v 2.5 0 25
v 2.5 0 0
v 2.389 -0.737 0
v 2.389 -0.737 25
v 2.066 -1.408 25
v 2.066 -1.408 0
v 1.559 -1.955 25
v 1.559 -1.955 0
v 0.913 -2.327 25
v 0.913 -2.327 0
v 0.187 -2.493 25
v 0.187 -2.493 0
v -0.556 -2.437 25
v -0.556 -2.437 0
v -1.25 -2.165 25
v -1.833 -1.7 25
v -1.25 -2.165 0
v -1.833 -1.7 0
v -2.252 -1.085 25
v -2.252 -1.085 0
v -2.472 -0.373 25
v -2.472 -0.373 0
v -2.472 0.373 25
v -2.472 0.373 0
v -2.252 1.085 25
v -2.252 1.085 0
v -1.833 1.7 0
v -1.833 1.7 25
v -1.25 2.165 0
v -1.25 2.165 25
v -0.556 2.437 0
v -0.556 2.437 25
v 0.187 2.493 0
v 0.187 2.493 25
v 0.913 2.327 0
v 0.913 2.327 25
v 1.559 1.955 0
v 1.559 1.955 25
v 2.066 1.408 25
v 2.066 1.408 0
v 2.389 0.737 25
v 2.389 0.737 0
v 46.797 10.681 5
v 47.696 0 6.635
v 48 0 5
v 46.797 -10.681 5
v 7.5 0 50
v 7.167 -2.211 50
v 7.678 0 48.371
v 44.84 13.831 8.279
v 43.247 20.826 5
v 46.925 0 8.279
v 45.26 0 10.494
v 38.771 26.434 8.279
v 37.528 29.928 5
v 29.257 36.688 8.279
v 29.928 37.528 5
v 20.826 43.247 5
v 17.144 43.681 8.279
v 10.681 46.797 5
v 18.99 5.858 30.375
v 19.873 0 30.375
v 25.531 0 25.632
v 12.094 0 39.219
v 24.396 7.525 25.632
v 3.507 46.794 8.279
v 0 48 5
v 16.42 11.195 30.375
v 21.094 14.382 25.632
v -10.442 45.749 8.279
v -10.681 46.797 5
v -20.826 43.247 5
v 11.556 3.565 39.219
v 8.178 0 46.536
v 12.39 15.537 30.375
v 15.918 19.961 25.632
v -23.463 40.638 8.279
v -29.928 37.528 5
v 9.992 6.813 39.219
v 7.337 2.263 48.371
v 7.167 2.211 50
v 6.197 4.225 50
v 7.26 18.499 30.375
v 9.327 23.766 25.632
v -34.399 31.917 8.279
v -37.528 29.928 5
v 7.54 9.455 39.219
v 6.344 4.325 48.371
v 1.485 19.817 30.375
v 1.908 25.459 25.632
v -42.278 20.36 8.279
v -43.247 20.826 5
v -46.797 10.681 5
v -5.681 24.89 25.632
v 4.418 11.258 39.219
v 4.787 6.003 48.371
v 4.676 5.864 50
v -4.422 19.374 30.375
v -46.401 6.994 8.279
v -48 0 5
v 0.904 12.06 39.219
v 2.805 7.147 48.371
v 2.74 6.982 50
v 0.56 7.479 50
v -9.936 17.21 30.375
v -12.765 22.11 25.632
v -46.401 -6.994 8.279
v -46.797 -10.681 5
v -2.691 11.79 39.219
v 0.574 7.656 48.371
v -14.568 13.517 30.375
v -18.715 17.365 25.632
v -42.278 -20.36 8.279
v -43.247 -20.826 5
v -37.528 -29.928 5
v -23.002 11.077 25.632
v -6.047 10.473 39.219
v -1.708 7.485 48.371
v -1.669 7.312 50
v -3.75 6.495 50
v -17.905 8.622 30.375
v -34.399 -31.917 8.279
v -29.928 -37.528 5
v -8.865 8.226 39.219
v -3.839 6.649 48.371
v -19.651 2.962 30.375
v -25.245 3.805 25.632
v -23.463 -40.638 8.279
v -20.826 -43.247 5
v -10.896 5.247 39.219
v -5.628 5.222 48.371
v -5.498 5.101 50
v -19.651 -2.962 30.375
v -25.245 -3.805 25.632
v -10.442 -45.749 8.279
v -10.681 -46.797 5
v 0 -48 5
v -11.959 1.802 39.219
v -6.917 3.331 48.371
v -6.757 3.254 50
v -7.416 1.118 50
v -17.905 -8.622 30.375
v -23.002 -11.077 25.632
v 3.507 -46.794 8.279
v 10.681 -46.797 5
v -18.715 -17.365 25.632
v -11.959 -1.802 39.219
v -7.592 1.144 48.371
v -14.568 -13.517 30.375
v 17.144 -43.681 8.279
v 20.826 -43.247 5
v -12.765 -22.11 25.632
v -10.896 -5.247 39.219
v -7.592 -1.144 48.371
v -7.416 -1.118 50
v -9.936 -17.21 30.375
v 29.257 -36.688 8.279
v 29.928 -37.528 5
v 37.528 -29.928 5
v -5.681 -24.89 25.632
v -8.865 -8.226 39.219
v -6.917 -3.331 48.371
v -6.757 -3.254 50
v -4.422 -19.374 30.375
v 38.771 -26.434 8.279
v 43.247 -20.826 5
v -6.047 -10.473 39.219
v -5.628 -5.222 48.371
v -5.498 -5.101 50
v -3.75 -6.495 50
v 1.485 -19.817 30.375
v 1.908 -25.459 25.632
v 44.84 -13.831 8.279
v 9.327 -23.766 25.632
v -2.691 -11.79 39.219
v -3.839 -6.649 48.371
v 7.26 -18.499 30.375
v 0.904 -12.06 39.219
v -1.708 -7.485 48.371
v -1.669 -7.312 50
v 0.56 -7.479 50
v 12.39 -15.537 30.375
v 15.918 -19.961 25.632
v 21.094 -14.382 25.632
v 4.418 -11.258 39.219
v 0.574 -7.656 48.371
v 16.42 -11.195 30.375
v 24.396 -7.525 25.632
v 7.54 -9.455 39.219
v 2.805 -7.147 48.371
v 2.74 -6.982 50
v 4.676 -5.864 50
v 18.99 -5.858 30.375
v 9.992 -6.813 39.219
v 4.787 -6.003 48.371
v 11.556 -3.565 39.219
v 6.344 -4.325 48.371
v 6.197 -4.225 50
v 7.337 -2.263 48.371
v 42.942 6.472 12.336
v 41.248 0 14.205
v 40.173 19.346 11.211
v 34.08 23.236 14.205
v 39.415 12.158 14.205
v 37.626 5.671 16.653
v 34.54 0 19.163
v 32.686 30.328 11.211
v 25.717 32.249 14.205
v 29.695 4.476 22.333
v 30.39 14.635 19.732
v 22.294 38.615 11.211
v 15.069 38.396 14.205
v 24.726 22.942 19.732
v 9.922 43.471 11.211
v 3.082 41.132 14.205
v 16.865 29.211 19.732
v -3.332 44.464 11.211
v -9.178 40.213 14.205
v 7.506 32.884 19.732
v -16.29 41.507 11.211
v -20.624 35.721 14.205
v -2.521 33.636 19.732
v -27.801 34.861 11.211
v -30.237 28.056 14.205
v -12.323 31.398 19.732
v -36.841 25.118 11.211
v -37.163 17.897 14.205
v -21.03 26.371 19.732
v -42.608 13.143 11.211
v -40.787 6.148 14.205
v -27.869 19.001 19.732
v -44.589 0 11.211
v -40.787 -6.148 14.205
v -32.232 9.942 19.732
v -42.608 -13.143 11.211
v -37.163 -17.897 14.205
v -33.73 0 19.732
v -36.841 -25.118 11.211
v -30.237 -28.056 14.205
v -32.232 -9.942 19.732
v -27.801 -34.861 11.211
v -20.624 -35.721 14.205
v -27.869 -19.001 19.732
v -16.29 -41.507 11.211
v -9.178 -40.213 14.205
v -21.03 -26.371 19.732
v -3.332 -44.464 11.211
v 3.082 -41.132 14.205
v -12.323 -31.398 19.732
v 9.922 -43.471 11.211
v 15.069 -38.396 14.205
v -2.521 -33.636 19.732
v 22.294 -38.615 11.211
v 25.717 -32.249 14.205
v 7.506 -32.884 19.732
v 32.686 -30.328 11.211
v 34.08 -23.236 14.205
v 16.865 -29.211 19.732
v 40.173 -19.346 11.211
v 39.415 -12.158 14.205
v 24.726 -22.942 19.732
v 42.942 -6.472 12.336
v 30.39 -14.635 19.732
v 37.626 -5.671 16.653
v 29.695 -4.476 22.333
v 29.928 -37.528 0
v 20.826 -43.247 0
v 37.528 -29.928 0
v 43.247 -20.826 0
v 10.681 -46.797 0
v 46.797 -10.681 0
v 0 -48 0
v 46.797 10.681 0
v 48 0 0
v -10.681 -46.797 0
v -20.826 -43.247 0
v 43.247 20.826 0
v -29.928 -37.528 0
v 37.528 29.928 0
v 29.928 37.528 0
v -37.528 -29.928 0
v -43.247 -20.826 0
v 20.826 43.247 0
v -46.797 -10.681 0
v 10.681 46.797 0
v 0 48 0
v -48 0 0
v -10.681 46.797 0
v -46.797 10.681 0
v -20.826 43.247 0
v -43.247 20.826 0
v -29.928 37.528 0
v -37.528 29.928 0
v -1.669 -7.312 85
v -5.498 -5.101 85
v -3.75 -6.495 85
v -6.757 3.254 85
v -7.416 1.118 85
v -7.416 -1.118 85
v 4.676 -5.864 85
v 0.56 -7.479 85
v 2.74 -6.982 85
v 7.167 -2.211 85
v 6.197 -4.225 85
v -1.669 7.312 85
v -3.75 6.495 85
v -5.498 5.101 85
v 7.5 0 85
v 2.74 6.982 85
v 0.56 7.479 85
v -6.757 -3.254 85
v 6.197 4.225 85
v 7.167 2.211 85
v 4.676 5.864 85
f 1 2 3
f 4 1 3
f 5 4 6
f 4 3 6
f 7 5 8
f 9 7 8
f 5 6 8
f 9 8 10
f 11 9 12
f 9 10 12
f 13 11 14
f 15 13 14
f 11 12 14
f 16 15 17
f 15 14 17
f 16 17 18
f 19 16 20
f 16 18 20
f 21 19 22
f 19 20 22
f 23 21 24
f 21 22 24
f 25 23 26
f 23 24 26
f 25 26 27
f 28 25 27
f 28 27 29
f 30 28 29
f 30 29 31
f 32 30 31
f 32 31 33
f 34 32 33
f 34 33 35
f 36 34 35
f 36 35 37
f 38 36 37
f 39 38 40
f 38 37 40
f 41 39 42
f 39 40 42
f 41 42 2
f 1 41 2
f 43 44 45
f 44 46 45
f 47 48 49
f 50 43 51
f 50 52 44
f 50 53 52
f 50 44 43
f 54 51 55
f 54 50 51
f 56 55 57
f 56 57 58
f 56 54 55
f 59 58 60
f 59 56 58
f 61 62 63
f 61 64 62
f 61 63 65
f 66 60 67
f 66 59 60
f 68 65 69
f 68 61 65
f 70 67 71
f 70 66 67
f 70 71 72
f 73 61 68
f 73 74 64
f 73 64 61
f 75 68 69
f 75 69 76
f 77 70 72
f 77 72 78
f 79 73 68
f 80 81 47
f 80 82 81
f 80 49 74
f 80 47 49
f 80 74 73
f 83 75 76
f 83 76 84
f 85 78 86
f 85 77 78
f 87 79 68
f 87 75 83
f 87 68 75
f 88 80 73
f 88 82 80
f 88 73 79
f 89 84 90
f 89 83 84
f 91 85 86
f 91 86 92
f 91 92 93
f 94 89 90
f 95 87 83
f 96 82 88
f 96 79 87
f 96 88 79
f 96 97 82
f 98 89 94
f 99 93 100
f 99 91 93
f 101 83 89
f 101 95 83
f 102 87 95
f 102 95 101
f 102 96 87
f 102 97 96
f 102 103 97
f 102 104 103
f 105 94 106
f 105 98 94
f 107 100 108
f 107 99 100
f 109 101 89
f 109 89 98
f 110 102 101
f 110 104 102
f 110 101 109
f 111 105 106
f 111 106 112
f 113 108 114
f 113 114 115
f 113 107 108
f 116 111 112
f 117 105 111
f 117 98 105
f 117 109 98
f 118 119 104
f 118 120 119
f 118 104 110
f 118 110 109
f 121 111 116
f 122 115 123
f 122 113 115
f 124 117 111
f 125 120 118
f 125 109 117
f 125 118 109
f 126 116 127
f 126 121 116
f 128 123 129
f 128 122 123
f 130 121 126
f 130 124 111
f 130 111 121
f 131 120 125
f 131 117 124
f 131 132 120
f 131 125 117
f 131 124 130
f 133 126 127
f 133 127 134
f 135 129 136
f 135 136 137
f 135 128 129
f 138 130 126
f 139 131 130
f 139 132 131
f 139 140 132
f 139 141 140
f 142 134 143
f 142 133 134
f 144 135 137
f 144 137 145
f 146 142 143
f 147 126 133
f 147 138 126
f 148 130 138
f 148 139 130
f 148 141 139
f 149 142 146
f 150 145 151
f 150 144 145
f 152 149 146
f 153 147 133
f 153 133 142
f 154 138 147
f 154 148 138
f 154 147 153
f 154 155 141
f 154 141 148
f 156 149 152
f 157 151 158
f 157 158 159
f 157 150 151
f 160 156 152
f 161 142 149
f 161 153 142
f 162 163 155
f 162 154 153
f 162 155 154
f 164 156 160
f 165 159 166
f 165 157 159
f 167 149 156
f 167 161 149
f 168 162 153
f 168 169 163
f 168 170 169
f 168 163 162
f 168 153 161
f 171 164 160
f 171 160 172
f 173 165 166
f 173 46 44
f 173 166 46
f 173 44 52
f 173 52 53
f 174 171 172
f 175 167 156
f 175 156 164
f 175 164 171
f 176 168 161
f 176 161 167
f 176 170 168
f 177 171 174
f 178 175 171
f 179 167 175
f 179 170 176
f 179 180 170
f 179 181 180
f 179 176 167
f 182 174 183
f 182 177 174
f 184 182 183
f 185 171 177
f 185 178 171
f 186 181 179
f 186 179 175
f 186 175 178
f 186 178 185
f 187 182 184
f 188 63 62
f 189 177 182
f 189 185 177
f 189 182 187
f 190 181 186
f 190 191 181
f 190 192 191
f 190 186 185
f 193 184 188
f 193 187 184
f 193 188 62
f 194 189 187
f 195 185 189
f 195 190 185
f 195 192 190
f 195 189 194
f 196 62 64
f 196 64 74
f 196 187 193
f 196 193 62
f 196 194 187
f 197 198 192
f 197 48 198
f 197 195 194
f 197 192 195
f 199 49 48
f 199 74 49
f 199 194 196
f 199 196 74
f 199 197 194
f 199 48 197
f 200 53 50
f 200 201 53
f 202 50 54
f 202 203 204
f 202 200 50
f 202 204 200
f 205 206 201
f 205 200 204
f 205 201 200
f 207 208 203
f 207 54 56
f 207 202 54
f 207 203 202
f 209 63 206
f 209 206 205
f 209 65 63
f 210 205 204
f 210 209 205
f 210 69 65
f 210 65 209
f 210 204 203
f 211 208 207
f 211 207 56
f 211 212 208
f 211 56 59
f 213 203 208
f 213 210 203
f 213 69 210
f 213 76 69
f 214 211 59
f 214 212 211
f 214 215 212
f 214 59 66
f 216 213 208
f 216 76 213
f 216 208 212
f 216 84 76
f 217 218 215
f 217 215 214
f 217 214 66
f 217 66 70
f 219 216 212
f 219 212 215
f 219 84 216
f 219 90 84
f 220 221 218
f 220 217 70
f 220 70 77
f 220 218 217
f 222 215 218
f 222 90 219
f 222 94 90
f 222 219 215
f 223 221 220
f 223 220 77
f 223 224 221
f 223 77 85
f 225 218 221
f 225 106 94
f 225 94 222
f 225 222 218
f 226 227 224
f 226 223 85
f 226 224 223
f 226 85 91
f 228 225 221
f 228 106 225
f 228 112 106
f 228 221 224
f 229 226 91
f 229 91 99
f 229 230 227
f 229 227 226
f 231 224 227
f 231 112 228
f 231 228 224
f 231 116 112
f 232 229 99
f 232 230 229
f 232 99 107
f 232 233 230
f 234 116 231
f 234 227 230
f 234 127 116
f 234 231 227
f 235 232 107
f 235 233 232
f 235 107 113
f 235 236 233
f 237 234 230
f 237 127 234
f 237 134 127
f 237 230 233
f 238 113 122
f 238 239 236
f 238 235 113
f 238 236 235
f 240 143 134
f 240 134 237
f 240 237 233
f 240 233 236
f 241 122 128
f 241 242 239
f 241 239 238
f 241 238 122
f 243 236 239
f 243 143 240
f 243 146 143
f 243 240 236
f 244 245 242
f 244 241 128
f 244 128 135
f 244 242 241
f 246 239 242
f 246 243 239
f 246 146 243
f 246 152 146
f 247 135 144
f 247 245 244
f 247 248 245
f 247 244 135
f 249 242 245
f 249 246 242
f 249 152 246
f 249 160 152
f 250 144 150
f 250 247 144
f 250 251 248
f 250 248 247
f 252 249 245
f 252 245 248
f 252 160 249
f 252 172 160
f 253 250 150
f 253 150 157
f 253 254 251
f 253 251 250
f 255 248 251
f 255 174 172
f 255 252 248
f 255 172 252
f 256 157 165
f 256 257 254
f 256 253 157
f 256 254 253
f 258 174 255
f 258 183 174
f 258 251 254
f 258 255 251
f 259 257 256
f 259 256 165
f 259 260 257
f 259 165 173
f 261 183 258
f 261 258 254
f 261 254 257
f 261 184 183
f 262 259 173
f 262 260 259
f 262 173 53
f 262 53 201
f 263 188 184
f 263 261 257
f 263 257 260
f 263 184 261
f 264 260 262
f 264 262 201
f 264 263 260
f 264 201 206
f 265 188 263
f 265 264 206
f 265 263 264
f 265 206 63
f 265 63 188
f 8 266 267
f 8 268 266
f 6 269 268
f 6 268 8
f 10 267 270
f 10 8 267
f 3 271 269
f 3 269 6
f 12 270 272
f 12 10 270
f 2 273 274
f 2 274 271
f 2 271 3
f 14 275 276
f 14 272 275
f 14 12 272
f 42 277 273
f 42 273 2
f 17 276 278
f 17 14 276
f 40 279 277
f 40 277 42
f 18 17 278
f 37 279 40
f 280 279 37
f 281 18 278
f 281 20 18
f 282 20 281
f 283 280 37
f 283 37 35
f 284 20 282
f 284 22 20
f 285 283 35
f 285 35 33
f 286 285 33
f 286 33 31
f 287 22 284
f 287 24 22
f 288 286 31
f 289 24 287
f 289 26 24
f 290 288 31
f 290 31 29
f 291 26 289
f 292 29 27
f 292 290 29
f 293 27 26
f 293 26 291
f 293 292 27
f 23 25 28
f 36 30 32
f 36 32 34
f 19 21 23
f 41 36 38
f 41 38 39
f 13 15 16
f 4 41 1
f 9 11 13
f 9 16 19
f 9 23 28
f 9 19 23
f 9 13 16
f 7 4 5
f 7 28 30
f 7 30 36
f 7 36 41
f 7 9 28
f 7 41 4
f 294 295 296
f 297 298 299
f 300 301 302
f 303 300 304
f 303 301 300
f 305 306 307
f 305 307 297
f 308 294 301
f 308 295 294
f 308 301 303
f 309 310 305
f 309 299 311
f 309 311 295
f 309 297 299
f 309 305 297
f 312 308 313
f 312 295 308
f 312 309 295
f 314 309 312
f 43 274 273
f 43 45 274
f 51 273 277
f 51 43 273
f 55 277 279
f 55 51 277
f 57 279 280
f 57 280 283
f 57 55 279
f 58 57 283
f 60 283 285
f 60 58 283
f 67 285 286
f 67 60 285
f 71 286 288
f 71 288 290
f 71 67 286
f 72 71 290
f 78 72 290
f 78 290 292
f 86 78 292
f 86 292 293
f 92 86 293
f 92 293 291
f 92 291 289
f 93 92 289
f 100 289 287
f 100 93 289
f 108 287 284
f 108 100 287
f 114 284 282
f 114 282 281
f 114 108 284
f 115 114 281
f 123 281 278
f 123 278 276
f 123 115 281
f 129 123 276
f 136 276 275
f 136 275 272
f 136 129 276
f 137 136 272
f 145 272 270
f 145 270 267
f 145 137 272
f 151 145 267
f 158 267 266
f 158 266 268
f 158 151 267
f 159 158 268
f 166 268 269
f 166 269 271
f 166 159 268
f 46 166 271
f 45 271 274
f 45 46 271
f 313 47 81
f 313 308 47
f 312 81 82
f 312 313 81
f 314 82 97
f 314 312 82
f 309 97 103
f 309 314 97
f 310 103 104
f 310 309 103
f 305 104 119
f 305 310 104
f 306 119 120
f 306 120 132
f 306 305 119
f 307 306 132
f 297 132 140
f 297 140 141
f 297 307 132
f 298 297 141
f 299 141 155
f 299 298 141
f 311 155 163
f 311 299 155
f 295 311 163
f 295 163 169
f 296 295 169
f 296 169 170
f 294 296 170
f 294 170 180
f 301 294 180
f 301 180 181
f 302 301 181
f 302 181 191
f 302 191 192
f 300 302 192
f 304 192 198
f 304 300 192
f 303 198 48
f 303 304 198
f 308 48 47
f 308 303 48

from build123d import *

# Parameters (mm, degrees)
F2_R     = 2.5
F3_DEPTH = 25


with BuildPart() as f1:
    # F0 (on Front) → F1 (revolve)
    with BuildSketch(Plane.XZ):
        with BuildLine():
            Line((0, 85), (0, 0))
            Line((0, 0), (48, 0))
            Line((48, 0), (48, 5))
            add(Edge.make_bspline(
                [(48, 5), (47.7693830737, 12.1516905368), (19.4170275378, 25.8092244503), (7.5425494924, 44.994633124), (7.5, 50)],
                knots=[0, 0, 0, 0, 0.5364054389, 1, 1, 1, 1], degree=3))
            Line((7.5, 50), (7.5, 85))
            Line((7.5, 85), (0, 85))
        make_face()
    revolve(axis=Axis((0, 0, 42.5), (0, 0, 1)))

    # F2 (on face) → F3 (cut)
    with BuildSketch(Plane(origin=(0, 0, 0), x_dir=(1, 0, 0), z_dir=(0, 0, -1))):
        Circle(F2_R)
    extrude(amount=-F3_DEPTH, mode=Mode.SUBTRACT)


solid = f1.part
